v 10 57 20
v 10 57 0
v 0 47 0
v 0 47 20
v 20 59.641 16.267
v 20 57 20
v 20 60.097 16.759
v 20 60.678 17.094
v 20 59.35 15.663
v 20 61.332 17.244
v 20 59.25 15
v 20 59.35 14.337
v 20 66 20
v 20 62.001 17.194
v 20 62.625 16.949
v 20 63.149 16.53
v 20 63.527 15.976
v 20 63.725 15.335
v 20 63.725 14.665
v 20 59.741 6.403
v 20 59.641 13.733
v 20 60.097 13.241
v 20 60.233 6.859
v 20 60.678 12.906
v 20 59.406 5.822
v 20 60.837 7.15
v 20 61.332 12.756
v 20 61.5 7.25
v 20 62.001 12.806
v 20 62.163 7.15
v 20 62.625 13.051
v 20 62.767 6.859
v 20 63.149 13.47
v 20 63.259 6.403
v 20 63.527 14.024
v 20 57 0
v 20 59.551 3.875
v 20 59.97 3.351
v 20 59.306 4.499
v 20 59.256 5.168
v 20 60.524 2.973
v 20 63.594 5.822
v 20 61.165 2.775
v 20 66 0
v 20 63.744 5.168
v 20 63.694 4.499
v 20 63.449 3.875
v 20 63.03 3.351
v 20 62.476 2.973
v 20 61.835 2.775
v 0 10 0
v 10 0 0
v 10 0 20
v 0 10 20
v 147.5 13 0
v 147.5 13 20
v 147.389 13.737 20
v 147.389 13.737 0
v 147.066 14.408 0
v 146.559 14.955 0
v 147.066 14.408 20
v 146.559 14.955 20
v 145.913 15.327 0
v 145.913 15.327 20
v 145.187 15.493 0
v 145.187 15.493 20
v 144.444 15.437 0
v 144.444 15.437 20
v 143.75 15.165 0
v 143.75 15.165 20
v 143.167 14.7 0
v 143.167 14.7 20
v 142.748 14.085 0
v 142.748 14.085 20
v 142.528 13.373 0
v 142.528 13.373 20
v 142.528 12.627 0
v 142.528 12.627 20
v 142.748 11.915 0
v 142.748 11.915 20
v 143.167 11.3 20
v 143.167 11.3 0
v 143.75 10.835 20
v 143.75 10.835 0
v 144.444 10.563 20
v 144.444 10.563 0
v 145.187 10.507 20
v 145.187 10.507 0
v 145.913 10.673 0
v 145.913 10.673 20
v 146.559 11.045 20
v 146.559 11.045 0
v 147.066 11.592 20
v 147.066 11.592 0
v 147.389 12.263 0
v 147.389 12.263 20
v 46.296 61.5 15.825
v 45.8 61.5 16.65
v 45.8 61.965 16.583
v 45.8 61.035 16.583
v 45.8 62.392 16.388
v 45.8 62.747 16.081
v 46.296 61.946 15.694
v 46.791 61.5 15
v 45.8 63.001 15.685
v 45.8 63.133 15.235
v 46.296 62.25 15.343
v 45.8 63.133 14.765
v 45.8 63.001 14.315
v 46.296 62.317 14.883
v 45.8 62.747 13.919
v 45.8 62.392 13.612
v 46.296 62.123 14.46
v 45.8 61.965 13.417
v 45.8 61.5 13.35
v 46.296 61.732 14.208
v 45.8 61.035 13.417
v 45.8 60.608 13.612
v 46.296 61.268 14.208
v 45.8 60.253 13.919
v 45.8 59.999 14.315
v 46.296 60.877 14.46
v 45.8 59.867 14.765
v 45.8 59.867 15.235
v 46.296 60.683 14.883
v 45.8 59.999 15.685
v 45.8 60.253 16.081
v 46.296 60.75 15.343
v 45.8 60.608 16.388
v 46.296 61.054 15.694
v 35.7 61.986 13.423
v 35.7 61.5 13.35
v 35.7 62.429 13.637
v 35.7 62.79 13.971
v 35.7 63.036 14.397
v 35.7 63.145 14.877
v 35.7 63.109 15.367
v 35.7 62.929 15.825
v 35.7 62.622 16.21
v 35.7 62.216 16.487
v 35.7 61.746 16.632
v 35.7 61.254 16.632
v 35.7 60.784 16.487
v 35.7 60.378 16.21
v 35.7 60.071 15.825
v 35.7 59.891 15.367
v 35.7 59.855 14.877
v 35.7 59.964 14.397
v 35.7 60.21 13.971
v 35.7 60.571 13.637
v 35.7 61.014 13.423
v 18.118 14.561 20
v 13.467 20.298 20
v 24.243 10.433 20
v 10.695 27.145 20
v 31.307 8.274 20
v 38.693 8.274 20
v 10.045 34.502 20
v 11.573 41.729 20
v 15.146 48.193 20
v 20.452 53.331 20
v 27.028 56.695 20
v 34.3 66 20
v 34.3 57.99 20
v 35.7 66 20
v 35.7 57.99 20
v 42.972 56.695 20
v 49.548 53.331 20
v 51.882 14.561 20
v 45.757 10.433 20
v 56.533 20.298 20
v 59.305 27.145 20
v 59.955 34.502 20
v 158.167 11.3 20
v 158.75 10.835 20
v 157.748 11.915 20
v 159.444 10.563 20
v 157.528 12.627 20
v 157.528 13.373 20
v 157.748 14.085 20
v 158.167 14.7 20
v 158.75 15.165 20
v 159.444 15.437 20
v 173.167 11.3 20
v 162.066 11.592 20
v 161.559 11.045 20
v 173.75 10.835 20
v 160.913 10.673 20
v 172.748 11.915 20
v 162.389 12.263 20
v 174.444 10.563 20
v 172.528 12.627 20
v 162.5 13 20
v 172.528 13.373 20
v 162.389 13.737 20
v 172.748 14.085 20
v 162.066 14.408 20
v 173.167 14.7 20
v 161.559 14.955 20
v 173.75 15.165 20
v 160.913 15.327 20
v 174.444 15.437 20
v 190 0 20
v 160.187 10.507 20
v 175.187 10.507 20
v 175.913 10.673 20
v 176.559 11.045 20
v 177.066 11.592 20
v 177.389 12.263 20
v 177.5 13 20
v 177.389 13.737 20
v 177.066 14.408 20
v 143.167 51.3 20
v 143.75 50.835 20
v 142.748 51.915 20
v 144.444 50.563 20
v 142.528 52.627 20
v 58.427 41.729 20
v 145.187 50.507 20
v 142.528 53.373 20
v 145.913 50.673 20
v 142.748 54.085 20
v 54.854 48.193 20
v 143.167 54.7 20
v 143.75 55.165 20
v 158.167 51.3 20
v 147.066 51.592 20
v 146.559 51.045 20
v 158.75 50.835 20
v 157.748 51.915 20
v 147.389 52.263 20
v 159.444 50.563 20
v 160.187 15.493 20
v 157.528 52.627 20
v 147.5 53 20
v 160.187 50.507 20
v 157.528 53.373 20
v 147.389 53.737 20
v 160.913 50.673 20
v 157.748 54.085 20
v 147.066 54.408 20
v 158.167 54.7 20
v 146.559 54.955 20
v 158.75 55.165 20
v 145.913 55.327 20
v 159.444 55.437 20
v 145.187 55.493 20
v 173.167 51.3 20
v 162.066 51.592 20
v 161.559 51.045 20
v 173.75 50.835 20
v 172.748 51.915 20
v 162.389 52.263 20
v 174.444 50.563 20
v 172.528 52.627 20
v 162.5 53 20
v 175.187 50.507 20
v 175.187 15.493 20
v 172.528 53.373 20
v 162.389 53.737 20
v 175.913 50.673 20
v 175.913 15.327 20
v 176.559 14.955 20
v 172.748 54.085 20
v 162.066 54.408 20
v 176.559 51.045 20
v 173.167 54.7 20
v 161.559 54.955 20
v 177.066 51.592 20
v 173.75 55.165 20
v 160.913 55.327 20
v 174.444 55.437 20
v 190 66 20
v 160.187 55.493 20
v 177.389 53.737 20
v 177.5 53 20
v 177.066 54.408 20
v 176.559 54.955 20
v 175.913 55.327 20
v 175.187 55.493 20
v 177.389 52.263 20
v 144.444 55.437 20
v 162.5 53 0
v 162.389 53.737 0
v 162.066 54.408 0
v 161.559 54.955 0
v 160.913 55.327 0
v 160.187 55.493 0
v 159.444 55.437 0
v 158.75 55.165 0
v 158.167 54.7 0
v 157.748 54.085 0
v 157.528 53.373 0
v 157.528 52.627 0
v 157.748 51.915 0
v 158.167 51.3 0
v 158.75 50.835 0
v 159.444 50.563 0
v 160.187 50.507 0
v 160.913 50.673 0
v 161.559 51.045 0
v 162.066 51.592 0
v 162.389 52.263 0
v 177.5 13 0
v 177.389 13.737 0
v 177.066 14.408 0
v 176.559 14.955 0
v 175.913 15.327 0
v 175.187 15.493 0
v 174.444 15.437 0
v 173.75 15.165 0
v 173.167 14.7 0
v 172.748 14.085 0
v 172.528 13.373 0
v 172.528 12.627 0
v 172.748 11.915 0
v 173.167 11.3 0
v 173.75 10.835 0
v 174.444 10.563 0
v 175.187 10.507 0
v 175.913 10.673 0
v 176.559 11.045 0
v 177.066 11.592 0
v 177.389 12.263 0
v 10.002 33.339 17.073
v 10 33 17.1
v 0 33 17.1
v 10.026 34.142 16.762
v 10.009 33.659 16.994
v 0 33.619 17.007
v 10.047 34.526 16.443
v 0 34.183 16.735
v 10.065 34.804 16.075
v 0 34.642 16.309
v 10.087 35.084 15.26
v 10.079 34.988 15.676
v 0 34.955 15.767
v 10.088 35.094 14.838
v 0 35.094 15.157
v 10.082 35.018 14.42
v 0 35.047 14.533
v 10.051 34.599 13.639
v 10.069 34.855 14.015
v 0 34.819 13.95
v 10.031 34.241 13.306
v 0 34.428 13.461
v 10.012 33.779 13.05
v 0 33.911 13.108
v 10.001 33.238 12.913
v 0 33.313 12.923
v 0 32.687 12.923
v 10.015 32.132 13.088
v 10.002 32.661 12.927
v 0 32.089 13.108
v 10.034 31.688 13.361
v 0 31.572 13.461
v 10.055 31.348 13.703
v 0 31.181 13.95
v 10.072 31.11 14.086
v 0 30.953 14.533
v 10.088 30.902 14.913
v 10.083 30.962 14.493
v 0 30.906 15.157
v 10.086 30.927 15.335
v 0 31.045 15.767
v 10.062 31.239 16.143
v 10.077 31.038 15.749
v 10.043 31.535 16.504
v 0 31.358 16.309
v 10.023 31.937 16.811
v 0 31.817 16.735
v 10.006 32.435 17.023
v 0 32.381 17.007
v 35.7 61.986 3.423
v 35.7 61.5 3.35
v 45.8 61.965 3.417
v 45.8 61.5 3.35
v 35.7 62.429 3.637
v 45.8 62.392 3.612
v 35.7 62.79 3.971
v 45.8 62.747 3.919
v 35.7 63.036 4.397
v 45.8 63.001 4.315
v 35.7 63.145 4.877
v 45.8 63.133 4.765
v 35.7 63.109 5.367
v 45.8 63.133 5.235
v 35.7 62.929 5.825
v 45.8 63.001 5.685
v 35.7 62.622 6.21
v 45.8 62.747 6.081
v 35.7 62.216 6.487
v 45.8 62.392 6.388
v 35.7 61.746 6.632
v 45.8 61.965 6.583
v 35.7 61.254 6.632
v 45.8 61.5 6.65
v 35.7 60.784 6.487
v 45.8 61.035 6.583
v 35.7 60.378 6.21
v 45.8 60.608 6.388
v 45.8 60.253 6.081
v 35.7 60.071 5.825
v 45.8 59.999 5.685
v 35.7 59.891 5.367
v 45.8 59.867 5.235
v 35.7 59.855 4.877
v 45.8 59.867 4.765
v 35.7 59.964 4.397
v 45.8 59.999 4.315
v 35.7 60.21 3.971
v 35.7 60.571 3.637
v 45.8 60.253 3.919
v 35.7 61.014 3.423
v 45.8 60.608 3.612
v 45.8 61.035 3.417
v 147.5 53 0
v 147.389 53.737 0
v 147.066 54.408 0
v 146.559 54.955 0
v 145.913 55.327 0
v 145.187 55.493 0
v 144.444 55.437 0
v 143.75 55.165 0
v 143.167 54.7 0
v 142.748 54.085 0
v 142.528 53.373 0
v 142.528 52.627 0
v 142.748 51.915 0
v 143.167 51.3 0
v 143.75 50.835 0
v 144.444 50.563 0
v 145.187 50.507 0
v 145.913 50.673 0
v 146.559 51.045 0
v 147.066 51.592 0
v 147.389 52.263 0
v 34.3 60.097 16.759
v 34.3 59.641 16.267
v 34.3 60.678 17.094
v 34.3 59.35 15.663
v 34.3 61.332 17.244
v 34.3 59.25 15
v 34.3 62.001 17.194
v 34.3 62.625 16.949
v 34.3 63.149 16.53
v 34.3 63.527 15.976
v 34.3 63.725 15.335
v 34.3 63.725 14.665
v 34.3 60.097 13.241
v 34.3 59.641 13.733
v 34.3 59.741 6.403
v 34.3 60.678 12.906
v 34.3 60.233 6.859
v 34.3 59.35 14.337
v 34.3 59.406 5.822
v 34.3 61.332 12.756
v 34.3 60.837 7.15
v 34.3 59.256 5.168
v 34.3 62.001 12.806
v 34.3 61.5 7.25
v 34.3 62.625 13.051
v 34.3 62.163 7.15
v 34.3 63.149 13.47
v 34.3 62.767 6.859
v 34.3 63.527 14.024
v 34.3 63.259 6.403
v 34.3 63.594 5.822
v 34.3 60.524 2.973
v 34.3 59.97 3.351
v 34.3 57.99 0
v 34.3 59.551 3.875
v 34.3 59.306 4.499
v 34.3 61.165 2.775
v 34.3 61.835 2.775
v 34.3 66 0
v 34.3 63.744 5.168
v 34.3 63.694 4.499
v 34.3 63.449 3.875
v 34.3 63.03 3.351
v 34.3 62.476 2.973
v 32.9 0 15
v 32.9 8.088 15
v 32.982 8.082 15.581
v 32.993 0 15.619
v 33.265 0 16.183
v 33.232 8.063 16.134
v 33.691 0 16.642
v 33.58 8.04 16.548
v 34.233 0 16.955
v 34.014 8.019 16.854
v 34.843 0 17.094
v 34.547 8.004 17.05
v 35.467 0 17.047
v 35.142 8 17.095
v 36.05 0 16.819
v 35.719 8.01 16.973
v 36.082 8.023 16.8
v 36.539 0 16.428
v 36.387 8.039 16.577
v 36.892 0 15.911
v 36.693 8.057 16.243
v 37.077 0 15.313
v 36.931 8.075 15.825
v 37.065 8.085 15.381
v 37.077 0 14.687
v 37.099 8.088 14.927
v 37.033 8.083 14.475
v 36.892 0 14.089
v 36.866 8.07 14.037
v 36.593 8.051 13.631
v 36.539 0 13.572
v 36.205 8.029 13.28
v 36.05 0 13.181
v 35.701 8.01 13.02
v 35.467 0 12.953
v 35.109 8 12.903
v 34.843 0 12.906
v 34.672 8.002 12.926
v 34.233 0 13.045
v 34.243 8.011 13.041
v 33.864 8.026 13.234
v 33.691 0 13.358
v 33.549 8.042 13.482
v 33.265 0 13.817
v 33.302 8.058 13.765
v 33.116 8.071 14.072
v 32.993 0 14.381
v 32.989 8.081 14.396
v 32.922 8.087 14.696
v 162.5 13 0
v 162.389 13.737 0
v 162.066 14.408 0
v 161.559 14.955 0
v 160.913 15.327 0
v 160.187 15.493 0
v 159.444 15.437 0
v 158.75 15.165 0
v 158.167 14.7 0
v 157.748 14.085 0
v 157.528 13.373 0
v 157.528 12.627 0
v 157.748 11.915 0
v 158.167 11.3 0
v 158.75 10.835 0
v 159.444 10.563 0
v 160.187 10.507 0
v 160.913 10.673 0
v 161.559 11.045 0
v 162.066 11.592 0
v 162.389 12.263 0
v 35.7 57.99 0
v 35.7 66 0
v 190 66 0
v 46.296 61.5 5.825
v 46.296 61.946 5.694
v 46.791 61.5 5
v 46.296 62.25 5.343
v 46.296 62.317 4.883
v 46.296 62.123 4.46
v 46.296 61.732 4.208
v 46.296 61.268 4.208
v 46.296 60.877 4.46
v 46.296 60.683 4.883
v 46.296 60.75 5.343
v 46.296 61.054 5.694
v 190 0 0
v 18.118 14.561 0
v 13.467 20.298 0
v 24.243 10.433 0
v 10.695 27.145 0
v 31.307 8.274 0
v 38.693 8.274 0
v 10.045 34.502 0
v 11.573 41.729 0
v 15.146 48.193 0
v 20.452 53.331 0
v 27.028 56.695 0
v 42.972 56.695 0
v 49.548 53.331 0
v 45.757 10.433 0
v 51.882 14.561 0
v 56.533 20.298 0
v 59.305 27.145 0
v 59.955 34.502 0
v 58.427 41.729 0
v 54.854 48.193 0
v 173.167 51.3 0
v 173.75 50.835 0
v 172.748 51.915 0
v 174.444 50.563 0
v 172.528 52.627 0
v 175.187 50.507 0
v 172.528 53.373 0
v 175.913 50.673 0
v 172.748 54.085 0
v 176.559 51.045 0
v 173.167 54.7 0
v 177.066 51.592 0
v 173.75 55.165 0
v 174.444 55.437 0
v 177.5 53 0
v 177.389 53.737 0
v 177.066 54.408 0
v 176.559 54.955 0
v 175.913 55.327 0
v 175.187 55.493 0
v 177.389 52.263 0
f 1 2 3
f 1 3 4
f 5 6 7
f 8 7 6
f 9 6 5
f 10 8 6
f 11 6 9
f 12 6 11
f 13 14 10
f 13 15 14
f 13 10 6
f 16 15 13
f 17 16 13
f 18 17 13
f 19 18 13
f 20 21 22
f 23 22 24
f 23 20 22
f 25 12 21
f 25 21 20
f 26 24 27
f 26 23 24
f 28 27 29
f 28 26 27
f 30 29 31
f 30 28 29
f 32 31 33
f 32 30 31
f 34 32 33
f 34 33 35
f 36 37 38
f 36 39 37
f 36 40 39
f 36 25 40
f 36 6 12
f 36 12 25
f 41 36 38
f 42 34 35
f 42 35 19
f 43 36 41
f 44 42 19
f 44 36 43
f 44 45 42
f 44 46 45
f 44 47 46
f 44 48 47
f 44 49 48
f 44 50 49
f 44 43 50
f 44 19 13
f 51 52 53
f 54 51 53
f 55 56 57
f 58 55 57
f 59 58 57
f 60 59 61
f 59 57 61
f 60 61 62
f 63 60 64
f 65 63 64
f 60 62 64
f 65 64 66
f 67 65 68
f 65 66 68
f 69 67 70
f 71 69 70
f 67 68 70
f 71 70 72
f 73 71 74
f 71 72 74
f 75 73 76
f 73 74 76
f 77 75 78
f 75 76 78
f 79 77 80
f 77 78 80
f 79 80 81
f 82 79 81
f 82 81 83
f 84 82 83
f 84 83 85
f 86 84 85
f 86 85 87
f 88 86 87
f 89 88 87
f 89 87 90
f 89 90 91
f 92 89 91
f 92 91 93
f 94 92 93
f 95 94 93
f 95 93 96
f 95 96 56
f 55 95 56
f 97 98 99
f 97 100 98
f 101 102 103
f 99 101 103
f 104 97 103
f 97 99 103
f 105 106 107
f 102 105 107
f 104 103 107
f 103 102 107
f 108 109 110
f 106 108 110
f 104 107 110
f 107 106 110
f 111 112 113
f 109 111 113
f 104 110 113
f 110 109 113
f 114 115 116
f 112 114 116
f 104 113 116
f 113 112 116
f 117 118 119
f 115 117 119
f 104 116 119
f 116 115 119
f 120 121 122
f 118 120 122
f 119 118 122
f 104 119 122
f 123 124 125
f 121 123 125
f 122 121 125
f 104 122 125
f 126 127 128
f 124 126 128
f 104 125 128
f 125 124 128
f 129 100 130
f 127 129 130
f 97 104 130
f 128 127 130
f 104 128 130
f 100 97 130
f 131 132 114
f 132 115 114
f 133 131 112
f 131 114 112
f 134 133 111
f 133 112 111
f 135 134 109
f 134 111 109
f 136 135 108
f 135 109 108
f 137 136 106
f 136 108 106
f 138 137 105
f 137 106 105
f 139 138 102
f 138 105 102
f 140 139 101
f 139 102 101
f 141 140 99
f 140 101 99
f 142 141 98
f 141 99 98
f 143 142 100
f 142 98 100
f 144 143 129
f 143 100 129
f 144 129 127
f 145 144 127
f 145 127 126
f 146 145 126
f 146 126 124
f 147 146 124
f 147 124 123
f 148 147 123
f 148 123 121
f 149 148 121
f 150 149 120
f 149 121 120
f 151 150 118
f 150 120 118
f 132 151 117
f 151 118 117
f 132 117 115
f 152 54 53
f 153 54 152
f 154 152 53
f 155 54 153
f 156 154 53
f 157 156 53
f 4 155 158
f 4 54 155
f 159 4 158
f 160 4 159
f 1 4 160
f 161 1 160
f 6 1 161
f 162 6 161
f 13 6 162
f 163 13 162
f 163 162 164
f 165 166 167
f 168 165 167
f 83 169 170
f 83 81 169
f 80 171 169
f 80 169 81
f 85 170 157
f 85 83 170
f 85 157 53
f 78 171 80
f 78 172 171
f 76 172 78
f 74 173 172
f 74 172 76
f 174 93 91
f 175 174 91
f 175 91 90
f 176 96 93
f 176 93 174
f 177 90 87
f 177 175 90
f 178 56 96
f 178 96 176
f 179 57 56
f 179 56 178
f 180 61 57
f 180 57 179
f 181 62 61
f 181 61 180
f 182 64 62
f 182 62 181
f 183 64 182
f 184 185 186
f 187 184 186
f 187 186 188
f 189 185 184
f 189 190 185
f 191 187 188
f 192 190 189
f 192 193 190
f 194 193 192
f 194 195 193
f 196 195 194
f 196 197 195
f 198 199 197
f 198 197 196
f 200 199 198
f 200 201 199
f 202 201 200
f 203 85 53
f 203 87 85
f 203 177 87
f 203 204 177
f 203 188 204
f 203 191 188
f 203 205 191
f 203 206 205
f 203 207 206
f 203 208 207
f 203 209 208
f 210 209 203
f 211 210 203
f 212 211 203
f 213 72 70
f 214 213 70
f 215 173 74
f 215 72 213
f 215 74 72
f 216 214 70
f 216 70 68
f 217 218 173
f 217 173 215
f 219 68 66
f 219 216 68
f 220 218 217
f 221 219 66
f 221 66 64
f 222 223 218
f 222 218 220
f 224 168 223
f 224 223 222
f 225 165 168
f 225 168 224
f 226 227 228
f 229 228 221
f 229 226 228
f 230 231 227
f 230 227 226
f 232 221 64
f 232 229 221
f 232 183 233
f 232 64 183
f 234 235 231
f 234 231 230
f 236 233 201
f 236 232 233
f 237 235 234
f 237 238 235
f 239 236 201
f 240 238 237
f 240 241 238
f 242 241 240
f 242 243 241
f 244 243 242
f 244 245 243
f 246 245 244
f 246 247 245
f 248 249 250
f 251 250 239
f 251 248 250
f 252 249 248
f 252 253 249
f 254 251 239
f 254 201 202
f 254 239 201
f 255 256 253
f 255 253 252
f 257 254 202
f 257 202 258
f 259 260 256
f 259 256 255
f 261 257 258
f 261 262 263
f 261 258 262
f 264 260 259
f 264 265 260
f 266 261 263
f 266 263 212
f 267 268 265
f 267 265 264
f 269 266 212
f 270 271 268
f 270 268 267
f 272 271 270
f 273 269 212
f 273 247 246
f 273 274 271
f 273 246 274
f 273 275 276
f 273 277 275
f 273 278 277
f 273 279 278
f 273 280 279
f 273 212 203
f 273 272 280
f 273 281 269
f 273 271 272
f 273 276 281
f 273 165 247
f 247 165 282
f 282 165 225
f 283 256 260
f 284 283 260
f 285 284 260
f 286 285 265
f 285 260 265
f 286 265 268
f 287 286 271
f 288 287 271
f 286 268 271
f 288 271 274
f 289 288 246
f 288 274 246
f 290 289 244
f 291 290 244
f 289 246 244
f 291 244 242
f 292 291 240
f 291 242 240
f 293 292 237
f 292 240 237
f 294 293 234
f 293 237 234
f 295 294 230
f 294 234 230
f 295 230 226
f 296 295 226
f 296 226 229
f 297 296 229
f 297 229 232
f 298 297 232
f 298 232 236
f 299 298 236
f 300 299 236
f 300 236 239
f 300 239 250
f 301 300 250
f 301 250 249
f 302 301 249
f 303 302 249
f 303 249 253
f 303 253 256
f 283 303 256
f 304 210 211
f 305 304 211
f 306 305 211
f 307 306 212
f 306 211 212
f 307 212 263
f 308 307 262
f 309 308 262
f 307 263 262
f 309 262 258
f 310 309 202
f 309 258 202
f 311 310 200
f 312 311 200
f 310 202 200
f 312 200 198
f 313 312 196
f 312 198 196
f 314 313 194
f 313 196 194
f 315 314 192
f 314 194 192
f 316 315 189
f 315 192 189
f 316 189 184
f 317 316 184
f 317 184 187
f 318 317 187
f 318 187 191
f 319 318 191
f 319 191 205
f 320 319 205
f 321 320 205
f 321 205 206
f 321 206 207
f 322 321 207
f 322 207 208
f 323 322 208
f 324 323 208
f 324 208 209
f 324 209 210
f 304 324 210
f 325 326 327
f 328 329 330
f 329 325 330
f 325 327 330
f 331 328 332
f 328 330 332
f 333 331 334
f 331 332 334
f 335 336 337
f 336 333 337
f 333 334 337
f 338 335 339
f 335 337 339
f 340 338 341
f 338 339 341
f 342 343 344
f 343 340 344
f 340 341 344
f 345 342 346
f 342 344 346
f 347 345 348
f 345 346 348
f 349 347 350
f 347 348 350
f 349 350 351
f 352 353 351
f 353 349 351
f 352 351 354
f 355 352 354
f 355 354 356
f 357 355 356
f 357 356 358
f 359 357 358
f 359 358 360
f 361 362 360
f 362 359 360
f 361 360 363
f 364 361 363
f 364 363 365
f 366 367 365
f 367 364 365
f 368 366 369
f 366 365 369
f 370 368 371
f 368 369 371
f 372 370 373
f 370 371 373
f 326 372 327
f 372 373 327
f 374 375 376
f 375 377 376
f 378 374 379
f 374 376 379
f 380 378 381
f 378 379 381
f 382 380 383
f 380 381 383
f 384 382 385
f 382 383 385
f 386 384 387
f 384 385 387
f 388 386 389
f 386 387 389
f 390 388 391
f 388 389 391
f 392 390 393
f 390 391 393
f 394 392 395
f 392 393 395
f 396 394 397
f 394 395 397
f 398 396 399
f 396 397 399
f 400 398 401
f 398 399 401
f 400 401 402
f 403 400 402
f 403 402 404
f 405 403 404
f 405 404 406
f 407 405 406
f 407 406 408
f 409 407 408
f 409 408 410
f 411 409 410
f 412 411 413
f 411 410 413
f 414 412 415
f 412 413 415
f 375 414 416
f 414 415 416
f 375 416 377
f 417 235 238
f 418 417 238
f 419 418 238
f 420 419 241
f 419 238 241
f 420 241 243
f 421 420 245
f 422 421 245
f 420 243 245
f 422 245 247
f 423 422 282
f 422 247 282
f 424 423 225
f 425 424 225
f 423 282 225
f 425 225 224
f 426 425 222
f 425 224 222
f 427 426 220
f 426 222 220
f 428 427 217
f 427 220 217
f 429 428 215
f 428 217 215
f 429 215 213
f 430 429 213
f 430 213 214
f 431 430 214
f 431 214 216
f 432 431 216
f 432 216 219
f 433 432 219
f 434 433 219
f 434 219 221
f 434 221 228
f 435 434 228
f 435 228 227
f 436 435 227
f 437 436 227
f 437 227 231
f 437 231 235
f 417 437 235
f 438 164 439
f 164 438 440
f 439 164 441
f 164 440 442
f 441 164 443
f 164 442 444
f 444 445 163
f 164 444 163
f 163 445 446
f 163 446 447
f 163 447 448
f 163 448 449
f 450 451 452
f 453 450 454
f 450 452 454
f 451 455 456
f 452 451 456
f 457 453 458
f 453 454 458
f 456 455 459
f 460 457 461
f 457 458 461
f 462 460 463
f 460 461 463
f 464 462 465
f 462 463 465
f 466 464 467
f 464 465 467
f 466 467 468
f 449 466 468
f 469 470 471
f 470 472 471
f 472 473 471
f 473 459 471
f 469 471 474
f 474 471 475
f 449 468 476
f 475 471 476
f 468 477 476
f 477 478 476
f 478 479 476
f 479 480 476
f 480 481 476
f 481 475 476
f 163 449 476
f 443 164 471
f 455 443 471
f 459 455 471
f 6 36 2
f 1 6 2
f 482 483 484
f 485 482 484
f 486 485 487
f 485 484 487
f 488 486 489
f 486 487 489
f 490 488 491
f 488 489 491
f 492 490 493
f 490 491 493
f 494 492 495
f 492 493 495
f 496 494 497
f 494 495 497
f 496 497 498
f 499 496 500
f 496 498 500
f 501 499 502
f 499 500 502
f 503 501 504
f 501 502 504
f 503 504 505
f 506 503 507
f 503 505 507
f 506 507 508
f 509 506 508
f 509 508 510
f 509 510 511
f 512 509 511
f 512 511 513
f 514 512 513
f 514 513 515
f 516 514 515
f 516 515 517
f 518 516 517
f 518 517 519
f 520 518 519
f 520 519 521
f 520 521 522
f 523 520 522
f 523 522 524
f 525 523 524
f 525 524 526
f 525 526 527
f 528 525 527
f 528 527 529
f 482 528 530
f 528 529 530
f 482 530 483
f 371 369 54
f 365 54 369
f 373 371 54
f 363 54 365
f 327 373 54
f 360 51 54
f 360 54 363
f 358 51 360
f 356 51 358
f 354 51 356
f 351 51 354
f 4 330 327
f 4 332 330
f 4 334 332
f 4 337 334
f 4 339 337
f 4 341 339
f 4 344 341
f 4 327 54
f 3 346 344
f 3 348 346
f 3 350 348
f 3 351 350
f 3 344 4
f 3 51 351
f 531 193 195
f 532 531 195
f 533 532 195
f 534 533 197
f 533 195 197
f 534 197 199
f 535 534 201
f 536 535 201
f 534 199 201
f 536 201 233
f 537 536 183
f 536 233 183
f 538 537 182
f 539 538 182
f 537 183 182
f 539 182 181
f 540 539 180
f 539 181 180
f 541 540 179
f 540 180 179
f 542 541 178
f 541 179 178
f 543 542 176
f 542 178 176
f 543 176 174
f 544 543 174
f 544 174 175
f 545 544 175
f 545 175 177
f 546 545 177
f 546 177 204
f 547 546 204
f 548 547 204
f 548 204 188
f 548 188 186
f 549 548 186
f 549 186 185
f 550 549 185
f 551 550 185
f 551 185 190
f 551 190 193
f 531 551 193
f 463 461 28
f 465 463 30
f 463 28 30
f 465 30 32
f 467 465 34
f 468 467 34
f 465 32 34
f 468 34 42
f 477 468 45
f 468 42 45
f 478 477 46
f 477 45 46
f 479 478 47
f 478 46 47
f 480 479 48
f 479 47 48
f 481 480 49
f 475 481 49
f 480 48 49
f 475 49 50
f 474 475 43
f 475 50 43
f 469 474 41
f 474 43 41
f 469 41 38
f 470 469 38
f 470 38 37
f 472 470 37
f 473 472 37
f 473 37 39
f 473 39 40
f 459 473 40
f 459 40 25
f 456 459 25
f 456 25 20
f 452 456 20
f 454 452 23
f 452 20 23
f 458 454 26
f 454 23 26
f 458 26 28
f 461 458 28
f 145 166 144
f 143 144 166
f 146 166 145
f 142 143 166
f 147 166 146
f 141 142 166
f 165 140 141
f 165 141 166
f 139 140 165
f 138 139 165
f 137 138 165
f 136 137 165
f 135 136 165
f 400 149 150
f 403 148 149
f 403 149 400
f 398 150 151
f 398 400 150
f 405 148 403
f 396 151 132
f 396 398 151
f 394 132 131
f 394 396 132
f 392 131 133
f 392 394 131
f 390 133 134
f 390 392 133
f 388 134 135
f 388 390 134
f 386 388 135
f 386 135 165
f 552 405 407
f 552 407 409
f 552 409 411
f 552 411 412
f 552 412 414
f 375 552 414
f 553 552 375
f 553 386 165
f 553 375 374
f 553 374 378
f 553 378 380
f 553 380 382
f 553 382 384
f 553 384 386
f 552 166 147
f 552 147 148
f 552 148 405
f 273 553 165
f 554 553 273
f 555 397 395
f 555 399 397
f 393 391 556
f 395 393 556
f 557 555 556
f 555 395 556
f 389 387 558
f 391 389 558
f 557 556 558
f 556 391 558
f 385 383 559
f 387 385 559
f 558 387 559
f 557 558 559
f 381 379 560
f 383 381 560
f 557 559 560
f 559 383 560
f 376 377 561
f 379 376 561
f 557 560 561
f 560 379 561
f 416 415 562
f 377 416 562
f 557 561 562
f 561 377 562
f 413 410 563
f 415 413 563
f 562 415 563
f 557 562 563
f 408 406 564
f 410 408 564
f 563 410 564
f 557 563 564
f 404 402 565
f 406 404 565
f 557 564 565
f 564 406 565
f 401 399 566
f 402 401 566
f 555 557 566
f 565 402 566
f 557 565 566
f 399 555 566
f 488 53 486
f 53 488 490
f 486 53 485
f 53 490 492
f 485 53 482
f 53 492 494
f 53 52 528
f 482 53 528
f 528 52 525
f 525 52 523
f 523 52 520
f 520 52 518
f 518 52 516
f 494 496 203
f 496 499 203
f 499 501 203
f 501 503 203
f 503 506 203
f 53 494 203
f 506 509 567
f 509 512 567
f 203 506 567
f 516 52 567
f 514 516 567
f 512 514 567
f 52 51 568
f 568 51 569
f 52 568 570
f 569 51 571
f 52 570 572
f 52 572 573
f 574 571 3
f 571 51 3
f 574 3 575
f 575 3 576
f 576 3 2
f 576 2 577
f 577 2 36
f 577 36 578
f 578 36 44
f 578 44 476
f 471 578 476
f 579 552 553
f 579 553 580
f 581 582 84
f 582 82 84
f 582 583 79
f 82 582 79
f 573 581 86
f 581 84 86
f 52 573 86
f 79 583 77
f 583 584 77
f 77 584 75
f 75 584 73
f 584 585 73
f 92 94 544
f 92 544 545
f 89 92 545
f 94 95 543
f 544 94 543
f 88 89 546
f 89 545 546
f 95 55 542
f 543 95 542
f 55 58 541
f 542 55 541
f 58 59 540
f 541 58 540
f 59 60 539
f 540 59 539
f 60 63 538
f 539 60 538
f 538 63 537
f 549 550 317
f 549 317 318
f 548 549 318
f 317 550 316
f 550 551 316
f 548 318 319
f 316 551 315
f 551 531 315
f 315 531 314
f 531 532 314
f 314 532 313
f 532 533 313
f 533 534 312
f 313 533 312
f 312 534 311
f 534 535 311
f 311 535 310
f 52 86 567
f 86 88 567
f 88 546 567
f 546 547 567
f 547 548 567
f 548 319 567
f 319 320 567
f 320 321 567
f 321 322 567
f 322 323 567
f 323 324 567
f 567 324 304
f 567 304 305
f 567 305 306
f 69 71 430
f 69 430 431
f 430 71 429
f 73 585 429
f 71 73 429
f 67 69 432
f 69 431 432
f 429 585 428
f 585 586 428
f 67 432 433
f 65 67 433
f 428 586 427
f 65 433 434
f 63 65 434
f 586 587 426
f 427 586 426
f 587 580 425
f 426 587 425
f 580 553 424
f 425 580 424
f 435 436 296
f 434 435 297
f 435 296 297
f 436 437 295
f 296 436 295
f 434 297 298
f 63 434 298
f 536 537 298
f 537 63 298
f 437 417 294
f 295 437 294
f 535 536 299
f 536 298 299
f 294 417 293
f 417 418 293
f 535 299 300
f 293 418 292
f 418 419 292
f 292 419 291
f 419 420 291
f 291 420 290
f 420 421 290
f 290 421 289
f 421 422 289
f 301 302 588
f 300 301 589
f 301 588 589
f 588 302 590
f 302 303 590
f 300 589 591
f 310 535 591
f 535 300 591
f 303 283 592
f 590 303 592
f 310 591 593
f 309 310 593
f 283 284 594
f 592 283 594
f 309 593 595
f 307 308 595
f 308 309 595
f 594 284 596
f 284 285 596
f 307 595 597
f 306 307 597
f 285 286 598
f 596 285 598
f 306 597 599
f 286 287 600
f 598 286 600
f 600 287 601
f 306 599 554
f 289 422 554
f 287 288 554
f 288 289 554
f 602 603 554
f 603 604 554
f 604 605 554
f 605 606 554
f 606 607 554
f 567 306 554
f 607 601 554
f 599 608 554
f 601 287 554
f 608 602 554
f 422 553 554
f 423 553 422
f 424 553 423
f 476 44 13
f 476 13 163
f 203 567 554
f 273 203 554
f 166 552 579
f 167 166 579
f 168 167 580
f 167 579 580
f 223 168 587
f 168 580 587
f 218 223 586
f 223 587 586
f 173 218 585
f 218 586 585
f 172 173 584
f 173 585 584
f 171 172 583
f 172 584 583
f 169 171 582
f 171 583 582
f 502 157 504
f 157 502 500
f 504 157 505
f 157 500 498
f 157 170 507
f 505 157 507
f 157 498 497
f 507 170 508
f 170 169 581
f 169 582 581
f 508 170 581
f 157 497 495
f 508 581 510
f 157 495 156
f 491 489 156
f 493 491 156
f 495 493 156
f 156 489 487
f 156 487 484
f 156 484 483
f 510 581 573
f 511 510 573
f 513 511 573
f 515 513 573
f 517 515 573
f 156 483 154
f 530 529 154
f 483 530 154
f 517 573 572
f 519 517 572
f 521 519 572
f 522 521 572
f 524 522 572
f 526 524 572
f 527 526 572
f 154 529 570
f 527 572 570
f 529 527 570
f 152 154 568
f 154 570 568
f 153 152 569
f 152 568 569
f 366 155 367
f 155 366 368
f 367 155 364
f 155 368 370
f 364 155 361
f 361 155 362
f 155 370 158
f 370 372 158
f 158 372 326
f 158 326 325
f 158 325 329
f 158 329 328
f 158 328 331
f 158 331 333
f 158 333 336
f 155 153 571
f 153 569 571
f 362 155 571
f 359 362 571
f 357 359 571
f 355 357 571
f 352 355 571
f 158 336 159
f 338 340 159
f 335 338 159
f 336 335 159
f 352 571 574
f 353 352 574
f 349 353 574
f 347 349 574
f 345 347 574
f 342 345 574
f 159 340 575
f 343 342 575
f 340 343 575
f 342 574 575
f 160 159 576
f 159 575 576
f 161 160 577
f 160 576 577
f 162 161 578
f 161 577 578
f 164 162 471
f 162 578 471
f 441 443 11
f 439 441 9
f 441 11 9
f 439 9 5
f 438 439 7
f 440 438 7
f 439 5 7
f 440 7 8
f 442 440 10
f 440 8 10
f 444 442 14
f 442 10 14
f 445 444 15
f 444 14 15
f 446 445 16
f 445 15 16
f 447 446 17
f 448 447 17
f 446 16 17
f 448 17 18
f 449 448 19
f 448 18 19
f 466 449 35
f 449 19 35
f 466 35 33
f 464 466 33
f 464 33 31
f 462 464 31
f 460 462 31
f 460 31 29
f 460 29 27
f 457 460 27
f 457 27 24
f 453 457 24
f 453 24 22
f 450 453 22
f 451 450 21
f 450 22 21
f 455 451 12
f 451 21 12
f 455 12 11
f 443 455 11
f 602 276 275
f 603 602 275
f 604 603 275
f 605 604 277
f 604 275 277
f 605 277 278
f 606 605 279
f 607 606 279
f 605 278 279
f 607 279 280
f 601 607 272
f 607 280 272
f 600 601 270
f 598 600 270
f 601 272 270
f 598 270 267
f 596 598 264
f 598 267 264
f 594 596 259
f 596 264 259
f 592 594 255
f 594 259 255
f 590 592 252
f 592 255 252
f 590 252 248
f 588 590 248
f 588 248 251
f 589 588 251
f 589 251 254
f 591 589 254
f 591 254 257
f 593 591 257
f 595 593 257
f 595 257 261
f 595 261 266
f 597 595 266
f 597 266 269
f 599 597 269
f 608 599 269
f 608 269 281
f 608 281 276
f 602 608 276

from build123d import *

# Parameters (mm, degrees)
SKETCH_1_W              = 190
SKETCH_1_H              = 66
EXTRUDE_1_DEPTH         = 20
SKETCH_2_R              = 25
CUT_EXTRUDE_1_DEPTH     = 203.12867189
SKETCH_3_W              = 20
SKETCH_3_H              = 9
CUT_EXTRUDE_2_DEPTH     = 203.12867189
SKETCH_4_W              = 1.4
SKETCH_4_H              = 16.93413418
CUT_EXTRUDE_3_DEPTH     = 203.12867189
CHAMFER_1_SIZE          = 10
SKETCH_5_R              = 2.25
CUT_EXTRUDE_4_DEPTH     = 14.3
HOLE_WIZARD_M4_1_D      = 3.3
HOLE_WIZARD_M4_1_DEPTH  = 10.1
HOLE_WIZARD_M4_1_TIP    = 0.991420021
HOLE_WIZARD_M5_1_REACH  = 204.129
HOLE_WIZARD_M5_1_BORE_R = 2.1
HOLE_WIZARD_M5_2_D      = 4.2
HOLE_WIZARD_M5_2_DEPTH  = 12.4
HOLE_WIZARD_M5_2_TIP    = 1.2618073
CHAMFER_2_SIZE          = 10
HOLE_WIZARD_M6_1_D      = 5
PATTERN_LINEAR_1_COUNT  = 3
PATTERN_LINEAR_1_PITCH  = 15


with BuildPart() as part:
    # 草图1 → 凸台-拉伸1 (new body)
    with BuildSketch(Plane.XY):
        with Locations((95, 33)):
            Rectangle(SKETCH_1_W, SKETCH_1_H)
    extrude(amount=EXTRUDE_1_DEPTH)

    # 草图2 → 切除-拉伸1 (cut, through all)
    with BuildSketch(Plane(origin=(0, 0, 0), x_dir=(-1, 0, 0), z_dir=(0, 0, -1))):
        with Locations((-35, 33)):
            Circle(SKETCH_2_R)
    extrude(amount=-CUT_EXTRUDE_1_DEPTH, mode=Mode.SUBTRACT)

    # 草图3 → 切除-拉伸2 (cut, through all)
    with BuildSketch(Plane(origin=(0, 0, 0), x_dir=(-1, 0, 0), z_dir=(0, 0, -1))):
        with Locations((-10, 61.5)):
            Rectangle(SKETCH_3_W, SKETCH_3_H)
    extrude(amount=-CUT_EXTRUDE_2_DEPTH, mode=Mode.SUBTRACT)

    # 草图4 → 切除-拉伸3 (cut, through all)
    with BuildSketch(Plane(origin=(0, 0, 0), x_dir=(-1, 0, 0), z_dir=(0, 0, -1))):
        with Locations((-35, 57.53293291)):
            Rectangle(SKETCH_4_W, SKETCH_4_H)
    extrude(amount=-CUT_EXTRUDE_3_DEPTH, mode=Mode.SUBTRACT)

    # 倒角1
    chamfer_1_edges = [part.edges().sort_by_distance(p)[0] for p in [
        (0, 57, 10),
    ]]
    chamfer(chamfer_1_edges, length=CHAMFER_1_SIZE)

    # 草图5 → 切除-拉伸4 (cut)
    with BuildSketch(Plane.ZY.offset(-20)):
        with Locations(Location((15, 61.5, 0), (0, 0, 270))):
            Circle(SKETCH_5_R)
        with Locations((5, 61.5)):
            Circle(SKETCH_5_R)
    extrude(amount=-CUT_EXTRUDE_4_DEPTH, mode=Mode.SUBTRACT)

    # M4 螺纹孔1
    with Locations(Plane.ZY.offset(-35.7)):
        with Locations((15, 61.5), (5, 61.5)):
            Hole(HOLE_WIZARD_M4_1_D / 2, depth=HOLE_WIZARD_M4_1_DEPTH)
            with Locations((0, 0, -(HOLE_WIZARD_M4_1_DEPTH + HOLE_WIZARD_M4_1_TIP / 2))):  # 118° drill point
                Cone(0, HOLE_WIZARD_M4_1_D / 2, HOLE_WIZARD_M4_1_TIP, mode=Mode.SUBTRACT)

    # M5 螺纹孔1 bore → M5 螺纹孔1 (cut, up to next)
    with BuildSketch(Plane.ZY, mode=Mode.PRIVATE) as hole_wizard_m5_1_sk1:
        with Locations((15, 33)):
            Circle(HOLE_WIZARD_M5_1_BORE_R)
    hole_wizard_m5_1_tool1 = extrude(hole_wizard_m5_1_sk1.sketch, amount=-HOLE_WIZARD_M5_1_REACH, mode=Mode.PRIVATE) & part.part
    add(hole_wizard_m5_1_tool1.solids().sort_by_distance((0, 33, 15))[0], mode=Mode.SUBTRACT)

    # M5 螺纹孔2
    with Locations(Plane.XZ):
        with Locations((35, 15)):
            Hole(HOLE_WIZARD_M5_2_D / 2, depth=HOLE_WIZARD_M5_2_DEPTH)
            with Locations((0, 0, -(HOLE_WIZARD_M5_2_DEPTH + HOLE_WIZARD_M5_2_TIP / 2))):  # 118° drill point
                Cone(0, HOLE_WIZARD_M5_2_D / 2, HOLE_WIZARD_M5_2_TIP, mode=Mode.SUBTRACT)

    # 倒角2
    chamfer_2_edges = [part.edges().sort_by_distance(p)[0] for p in [
        (0, 0, 10),
    ]]
    chamfer(chamfer_2_edges, length=CHAMFER_2_SIZE)

    # M6 螺纹孔1 (through all)
    with Locations(Plane(origin=(0, 0, 0), x_dir=(-1, 0, 0), z_dir=(0, 0, -1))):
        with Locations((-175, 53), (-175, 13)):
            hole_wizard_m6_1 = Hole(HOLE_WIZARD_M6_1_D / 2)

    # 阵列(线性)1: M6 螺纹孔1 ×3
    with Locations(*[(-i * PATTERN_LINEAR_1_PITCH, 0, 0) for i in range(1, PATTERN_LINEAR_1_COUNT)]):
        add(hole_wizard_m6_1, mode=Mode.SUBTRACT)


solid = part.part
